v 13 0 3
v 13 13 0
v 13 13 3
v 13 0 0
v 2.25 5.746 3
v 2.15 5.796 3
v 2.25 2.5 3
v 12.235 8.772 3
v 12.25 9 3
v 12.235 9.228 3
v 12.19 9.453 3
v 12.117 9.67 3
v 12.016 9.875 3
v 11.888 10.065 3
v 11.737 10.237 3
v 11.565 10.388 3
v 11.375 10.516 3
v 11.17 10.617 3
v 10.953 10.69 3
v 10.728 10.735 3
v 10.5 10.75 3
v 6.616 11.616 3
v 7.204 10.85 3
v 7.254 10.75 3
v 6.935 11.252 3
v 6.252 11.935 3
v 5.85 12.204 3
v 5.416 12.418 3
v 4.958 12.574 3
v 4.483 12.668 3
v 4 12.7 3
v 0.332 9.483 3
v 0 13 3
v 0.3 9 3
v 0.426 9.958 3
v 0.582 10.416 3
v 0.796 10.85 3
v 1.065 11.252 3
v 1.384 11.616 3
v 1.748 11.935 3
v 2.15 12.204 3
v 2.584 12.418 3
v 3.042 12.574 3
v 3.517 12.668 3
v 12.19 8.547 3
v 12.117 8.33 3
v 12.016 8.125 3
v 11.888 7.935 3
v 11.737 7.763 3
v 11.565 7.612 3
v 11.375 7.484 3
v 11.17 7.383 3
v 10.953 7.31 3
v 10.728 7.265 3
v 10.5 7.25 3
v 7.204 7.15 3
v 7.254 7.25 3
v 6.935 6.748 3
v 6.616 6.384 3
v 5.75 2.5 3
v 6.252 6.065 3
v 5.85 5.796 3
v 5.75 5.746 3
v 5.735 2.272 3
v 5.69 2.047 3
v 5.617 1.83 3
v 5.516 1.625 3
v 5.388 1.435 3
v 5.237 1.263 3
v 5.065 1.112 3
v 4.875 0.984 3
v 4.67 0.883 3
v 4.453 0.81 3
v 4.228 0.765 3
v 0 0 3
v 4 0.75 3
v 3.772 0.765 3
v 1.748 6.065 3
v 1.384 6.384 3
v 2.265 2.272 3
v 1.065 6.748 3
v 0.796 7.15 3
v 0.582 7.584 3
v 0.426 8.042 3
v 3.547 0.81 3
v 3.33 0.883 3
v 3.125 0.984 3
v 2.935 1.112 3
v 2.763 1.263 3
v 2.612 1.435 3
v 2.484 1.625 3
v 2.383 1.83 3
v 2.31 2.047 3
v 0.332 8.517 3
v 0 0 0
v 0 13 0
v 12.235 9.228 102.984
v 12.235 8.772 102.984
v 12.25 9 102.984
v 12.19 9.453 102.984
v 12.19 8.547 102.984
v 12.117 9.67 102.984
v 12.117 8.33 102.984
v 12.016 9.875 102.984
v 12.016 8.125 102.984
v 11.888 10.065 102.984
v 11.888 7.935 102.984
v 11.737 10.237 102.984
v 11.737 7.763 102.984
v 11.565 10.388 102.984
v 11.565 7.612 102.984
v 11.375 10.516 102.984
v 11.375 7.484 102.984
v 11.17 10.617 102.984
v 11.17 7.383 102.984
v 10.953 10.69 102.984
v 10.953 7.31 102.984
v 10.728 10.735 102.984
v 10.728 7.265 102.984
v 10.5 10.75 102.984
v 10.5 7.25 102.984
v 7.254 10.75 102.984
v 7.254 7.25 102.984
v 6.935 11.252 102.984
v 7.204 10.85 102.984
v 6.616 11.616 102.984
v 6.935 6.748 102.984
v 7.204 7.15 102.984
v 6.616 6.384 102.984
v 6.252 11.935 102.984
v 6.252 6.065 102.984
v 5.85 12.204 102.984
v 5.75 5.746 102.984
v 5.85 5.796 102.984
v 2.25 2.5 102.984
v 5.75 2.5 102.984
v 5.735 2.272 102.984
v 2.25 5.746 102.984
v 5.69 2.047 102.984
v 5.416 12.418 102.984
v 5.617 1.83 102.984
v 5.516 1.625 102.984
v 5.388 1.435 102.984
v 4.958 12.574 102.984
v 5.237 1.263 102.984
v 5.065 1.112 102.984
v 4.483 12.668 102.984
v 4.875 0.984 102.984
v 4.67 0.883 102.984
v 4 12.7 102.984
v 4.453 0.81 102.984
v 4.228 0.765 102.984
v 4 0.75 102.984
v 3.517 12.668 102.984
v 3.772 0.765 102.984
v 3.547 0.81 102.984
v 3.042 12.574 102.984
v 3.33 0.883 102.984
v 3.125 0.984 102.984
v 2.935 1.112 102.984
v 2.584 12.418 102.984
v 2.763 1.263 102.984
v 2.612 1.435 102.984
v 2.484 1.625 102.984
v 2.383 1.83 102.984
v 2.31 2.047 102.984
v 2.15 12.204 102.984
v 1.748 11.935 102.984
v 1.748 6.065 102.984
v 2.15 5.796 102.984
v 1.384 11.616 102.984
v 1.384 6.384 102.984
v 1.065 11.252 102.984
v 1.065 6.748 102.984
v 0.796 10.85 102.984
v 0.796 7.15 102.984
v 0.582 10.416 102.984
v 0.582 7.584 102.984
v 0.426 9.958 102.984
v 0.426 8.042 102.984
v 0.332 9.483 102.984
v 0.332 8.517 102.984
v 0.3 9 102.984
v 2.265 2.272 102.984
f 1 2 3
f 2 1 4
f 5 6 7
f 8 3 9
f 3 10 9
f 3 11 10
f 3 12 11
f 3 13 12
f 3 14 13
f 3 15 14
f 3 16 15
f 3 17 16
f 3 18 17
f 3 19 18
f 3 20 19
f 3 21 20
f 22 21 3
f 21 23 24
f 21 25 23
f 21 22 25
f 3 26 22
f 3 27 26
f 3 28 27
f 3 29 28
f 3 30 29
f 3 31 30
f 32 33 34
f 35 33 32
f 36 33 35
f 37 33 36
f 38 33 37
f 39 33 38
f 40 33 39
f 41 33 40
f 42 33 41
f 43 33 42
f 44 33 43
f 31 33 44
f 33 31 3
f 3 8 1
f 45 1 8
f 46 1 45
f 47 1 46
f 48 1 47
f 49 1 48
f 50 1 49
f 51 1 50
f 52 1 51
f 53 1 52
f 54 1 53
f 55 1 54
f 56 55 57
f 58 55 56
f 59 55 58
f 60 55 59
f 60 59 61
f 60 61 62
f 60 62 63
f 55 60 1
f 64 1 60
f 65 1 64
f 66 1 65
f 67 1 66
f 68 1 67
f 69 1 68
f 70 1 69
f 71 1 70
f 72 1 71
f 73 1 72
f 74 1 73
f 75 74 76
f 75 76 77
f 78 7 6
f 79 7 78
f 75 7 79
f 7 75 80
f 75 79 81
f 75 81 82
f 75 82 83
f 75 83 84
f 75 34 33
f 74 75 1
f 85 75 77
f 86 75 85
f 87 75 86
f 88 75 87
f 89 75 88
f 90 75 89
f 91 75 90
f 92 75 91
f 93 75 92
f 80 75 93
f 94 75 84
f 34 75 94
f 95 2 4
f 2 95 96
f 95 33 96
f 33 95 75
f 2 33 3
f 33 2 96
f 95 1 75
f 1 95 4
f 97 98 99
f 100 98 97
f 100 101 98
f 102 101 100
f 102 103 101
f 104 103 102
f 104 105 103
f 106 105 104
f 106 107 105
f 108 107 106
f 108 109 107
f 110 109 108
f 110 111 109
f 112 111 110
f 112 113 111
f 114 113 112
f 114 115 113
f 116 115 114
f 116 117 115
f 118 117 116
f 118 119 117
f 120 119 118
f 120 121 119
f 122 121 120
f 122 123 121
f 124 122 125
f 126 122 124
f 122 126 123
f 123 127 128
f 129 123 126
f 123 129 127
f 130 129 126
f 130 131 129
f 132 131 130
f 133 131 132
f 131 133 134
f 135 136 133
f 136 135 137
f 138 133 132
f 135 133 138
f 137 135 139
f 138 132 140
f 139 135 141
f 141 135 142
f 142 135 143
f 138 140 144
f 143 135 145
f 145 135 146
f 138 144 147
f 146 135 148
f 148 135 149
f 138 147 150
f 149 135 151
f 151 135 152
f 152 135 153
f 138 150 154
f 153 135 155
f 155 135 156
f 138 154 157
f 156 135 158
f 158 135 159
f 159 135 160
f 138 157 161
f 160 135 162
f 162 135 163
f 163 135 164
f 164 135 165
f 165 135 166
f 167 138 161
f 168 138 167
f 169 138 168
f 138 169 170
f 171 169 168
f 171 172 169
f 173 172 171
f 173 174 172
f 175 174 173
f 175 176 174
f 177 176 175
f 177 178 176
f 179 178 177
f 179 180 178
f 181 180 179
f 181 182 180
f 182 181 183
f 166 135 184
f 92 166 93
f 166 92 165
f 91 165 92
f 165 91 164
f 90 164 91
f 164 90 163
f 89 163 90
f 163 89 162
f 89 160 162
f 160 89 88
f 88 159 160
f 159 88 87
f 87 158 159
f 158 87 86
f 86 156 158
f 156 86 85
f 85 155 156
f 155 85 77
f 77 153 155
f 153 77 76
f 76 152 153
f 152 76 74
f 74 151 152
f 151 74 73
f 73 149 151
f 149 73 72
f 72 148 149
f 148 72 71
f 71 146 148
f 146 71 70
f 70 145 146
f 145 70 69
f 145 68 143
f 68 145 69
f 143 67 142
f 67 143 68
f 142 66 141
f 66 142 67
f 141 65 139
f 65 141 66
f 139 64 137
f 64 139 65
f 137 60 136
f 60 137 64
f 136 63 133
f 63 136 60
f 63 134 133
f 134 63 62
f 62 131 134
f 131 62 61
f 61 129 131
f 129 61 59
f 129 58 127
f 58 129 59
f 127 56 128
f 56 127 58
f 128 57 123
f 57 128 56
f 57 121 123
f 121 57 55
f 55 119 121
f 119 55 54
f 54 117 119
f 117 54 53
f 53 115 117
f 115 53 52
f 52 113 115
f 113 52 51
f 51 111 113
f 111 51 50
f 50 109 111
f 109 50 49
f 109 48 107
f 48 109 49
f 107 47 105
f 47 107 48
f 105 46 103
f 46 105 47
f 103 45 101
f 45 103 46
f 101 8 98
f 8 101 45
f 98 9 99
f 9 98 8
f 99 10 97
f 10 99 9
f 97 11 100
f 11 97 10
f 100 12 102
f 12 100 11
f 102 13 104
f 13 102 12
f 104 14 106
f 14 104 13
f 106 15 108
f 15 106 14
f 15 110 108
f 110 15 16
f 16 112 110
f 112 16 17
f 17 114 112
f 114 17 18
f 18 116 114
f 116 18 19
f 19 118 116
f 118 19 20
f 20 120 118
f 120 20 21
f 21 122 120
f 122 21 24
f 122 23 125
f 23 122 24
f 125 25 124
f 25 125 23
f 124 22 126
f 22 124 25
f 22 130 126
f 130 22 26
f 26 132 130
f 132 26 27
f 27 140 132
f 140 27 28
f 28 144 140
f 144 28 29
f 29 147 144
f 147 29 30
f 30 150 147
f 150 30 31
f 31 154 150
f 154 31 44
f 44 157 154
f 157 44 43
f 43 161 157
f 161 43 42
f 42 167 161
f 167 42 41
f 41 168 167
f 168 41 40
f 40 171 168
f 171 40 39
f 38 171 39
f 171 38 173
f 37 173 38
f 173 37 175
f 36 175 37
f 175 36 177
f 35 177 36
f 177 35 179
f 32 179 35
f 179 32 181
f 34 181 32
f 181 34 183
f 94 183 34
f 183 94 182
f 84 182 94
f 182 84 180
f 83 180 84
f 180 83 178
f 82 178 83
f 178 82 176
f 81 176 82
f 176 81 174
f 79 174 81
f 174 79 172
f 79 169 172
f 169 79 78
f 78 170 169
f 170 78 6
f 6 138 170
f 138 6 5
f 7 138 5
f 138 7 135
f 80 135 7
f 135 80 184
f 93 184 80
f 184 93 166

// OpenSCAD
e = 1/64;

slot_width = 4.0;
L_leg_length = 11; // possibly 12
extent_length = 14.0;

center_diameter = 8.0;


module ridge_outline () {

  both_inset = 0.5;
  inset = both_inset / 2;
  ridge_width = slot_width - 0.5;
  half_ridge_width = ridge_width / 2;

  L_vert_to_horiz_start = 6.5; // measured is 7.0

  ridge_center_radius = (center_diameter - 0.6) / 2;

  rotate([0, 0, -90])
    translate([-half_ridge_width, -half_ridge_width])
  union () {
    square([ridge_width, L_vert_to_horiz_start + half_ridge_width]);
    translate([half_ridge_width, L_vert_to_horiz_start + half_ridge_width]) {
      circle(d = ridge_width, $fn = 48);
    }

    square([L_vert_to_horiz_start + half_ridge_width, ridge_width]);
    translate([L_vert_to_horiz_start + half_ridge_width, half_ridge_width]) {
      circle(d = ridge_width, $fn = 48);
    }

    translate([half_ridge_width,
               half_ridge_width]) {
      circle(r = ridge_center_radius, $fn = 48);
    }
  }
}

module generate_ridge (height = 2.0 + 1.5) {

  linear_extrude(h = height) {
    ridge_outline();
  }

}


if (!true) {
  //ridge_outline();
  generate_ridge(height = 2.0 + 1.0);
 } else {

  h = 3;
  translate ([0, 0, 0]) cube([10 + 3, 10 + 3, h]);
  translate ([4, 9, h-e]) { generate_ridge(height = 2.0 + 1.5); }

 }
